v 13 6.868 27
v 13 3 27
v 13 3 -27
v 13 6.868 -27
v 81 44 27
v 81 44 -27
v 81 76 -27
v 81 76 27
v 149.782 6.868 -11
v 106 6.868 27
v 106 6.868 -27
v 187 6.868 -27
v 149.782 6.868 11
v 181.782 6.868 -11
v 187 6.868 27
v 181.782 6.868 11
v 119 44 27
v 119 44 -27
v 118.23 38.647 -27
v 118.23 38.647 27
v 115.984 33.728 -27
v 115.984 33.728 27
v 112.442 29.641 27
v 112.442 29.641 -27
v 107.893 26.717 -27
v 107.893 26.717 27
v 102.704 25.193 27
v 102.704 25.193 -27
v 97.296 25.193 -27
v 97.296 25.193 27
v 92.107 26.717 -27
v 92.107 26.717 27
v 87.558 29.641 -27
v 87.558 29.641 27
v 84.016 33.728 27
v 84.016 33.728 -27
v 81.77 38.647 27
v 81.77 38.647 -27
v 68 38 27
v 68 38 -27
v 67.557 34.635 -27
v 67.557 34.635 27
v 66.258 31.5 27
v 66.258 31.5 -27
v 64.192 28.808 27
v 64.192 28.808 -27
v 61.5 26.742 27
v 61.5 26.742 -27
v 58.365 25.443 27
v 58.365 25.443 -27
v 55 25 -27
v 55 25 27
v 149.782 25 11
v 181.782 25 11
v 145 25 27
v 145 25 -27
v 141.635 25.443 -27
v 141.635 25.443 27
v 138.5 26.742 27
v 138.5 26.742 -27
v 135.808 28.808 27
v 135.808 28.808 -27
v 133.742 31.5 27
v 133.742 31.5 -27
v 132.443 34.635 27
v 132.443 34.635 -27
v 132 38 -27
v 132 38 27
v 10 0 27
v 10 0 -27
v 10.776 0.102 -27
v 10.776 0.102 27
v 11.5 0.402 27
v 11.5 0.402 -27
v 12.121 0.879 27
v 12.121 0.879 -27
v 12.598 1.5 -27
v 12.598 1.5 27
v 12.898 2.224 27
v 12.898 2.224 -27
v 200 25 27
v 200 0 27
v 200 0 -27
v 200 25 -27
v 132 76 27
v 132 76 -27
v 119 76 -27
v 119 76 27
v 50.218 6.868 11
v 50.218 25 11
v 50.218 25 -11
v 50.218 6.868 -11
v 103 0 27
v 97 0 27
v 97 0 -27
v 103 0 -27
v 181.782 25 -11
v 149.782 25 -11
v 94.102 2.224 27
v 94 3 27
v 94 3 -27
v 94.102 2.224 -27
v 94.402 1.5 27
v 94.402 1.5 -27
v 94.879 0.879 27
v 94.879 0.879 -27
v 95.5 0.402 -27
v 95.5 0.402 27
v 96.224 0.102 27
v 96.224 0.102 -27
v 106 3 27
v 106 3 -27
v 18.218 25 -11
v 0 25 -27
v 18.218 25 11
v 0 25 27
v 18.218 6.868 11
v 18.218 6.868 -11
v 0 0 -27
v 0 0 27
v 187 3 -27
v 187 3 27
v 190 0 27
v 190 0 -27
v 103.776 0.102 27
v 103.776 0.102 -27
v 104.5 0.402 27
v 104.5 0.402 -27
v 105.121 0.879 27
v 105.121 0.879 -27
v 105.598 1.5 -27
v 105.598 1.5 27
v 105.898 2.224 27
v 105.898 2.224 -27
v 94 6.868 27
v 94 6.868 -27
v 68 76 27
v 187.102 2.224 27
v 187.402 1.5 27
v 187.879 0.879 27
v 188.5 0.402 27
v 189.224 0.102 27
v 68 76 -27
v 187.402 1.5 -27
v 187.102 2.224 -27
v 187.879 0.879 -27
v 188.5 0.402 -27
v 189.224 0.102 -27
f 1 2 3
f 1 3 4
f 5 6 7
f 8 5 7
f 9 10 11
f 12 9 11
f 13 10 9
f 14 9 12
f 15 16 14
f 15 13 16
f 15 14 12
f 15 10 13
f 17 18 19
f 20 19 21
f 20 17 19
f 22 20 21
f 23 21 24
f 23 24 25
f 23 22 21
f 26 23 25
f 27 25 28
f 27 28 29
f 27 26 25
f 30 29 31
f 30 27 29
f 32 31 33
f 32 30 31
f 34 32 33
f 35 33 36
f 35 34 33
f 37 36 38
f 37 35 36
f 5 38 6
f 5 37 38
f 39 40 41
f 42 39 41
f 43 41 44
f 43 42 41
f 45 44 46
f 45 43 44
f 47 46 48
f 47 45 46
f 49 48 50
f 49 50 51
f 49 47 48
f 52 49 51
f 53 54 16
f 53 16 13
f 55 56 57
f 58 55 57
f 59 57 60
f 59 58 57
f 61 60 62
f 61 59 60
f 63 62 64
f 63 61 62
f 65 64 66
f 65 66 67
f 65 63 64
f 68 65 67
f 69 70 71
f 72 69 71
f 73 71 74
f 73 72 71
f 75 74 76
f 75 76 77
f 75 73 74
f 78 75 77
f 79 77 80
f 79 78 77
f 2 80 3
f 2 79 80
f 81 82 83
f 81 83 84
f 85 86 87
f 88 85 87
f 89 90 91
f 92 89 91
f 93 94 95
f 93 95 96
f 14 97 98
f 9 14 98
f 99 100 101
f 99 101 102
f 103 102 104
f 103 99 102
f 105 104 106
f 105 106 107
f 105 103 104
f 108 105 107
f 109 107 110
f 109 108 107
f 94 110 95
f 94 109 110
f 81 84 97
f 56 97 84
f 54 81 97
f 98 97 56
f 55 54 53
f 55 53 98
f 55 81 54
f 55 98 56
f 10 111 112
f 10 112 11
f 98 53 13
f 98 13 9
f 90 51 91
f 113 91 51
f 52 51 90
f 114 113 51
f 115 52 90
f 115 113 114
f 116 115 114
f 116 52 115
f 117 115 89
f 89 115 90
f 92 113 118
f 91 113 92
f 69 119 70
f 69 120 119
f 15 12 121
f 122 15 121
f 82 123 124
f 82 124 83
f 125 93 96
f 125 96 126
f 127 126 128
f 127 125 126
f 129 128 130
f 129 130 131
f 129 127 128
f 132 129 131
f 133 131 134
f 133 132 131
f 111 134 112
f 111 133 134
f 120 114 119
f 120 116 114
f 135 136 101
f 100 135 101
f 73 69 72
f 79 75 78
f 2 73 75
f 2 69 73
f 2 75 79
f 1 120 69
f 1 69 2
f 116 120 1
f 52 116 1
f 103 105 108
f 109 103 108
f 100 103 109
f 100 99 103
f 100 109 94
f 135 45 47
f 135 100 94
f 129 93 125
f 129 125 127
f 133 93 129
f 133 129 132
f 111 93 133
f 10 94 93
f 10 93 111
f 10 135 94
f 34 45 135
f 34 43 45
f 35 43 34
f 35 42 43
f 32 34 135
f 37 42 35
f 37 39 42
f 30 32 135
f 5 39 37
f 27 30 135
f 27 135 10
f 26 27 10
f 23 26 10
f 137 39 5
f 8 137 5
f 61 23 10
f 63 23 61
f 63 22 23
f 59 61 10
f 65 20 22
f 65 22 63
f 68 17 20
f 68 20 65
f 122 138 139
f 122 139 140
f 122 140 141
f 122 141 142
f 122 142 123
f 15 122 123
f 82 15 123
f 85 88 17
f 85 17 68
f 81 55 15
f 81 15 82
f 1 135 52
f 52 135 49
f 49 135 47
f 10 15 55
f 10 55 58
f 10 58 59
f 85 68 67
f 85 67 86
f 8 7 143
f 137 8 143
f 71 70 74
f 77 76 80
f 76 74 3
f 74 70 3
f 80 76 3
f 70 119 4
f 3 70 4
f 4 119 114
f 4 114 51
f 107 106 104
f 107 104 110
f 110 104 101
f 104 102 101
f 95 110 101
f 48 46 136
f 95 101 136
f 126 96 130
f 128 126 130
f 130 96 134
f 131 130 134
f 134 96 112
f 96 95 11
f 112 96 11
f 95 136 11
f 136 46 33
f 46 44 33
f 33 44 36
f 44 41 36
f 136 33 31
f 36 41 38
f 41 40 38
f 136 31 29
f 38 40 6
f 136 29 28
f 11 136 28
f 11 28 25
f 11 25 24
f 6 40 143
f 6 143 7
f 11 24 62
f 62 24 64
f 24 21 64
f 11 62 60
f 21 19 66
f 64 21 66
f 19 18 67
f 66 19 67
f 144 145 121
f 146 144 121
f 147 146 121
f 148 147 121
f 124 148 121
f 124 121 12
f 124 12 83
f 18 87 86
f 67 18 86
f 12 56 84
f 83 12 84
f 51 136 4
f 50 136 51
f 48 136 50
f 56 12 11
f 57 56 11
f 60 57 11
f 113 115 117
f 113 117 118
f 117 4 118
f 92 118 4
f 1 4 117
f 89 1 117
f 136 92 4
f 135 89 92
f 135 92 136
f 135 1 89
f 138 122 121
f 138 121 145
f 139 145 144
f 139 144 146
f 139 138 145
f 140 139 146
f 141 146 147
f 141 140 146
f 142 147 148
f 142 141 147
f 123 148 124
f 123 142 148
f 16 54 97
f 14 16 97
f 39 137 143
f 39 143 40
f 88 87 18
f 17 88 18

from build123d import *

# Parameters (mm, degrees)
BOSS_EXTRUDE1_DEPTH = 27
SKETCH2_W           = 32
SKETCH2_H           = 22
CUT_EXTRUDE1_DEPTH  = 209.158593385


with BuildPart() as part:
    # Sketch1 → Boss-Extrude1 (new, symmetric)
    with BuildSketch(Plane.XY):
        with BuildLine():
            Line((0, 0), (10, 0))
            ThreePointArc((10, 0), (12.121320344, 0.878679656), (13, 3))
            Line((13, 3), (13, 6.867571163))
            Line((13, 6.867571163), (94, 6.867571163))
            Line((94, 6.867571163), (94, 3))
            ThreePointArc((94, 3), (94.878679656, 0.878679656), (97, 0))
            Line((97, 0), (103, 0))
            ThreePointArc((103, 0), (105.121320344, 0.878679656), (106, 3))
            Line((106, 3), (106, 6.867571163))
            Line((106, 6.867571163), (187, 6.867571163))
            Line((187, 6.867571163), (187, 3))
            ThreePointArc((187, 3), (187.878679656, 0.878679656), (190, 0))
            Line((190, 0), (200, 0))
            Line((200, 0), (200, 25))
            Line((200, 25), (145, 25))
            ThreePointArc((145, 25), (135.807611845, 28.807611845), (132, 38))
            Line((132, 38), (132, 76))
            Line((132, 76), (119, 76))
            Line((119, 76), (119, 44))
            ThreePointArc((119, 44), (100, 25), (81, 44))
            Line((81, 44), (81, 76))
            Line((81, 76), (68, 76))
            Line((68, 76), (68, 38))
            ThreePointArc((68, 38), (64.192388155, 28.807611845), (55, 25))
            Line((55, 25), (0, 25))
            Line((0, 25), (0, 0))
        make_face()
    extrude(amount=BOSS_EXTRUDE1_DEPTH, both=True)

    # Sketch2 → Cut-Extrude1 (cut, through all)
    with BuildSketch(Plane(origin=(0, 25, 0), x_dir=(1, 0, 0), z_dir=(0, 1, 0))):
        with Locations((34.218039328, 0)):
            Rectangle(SKETCH2_W, SKETCH2_H)
    cut_extrude1 = extrude(amount=-CUT_EXTRUDE1_DEPTH, mode=Mode.SUBTRACT)

    # Mirror1: Cut-Extrude1 across plane
    add(cut_extrude1.mirror(Plane(origin=(100, 0, 0), x_dir=(0, 0, 1), z_dir=(1, 0, 0))), mode=Mode.SUBTRACT)


solid = part.part
